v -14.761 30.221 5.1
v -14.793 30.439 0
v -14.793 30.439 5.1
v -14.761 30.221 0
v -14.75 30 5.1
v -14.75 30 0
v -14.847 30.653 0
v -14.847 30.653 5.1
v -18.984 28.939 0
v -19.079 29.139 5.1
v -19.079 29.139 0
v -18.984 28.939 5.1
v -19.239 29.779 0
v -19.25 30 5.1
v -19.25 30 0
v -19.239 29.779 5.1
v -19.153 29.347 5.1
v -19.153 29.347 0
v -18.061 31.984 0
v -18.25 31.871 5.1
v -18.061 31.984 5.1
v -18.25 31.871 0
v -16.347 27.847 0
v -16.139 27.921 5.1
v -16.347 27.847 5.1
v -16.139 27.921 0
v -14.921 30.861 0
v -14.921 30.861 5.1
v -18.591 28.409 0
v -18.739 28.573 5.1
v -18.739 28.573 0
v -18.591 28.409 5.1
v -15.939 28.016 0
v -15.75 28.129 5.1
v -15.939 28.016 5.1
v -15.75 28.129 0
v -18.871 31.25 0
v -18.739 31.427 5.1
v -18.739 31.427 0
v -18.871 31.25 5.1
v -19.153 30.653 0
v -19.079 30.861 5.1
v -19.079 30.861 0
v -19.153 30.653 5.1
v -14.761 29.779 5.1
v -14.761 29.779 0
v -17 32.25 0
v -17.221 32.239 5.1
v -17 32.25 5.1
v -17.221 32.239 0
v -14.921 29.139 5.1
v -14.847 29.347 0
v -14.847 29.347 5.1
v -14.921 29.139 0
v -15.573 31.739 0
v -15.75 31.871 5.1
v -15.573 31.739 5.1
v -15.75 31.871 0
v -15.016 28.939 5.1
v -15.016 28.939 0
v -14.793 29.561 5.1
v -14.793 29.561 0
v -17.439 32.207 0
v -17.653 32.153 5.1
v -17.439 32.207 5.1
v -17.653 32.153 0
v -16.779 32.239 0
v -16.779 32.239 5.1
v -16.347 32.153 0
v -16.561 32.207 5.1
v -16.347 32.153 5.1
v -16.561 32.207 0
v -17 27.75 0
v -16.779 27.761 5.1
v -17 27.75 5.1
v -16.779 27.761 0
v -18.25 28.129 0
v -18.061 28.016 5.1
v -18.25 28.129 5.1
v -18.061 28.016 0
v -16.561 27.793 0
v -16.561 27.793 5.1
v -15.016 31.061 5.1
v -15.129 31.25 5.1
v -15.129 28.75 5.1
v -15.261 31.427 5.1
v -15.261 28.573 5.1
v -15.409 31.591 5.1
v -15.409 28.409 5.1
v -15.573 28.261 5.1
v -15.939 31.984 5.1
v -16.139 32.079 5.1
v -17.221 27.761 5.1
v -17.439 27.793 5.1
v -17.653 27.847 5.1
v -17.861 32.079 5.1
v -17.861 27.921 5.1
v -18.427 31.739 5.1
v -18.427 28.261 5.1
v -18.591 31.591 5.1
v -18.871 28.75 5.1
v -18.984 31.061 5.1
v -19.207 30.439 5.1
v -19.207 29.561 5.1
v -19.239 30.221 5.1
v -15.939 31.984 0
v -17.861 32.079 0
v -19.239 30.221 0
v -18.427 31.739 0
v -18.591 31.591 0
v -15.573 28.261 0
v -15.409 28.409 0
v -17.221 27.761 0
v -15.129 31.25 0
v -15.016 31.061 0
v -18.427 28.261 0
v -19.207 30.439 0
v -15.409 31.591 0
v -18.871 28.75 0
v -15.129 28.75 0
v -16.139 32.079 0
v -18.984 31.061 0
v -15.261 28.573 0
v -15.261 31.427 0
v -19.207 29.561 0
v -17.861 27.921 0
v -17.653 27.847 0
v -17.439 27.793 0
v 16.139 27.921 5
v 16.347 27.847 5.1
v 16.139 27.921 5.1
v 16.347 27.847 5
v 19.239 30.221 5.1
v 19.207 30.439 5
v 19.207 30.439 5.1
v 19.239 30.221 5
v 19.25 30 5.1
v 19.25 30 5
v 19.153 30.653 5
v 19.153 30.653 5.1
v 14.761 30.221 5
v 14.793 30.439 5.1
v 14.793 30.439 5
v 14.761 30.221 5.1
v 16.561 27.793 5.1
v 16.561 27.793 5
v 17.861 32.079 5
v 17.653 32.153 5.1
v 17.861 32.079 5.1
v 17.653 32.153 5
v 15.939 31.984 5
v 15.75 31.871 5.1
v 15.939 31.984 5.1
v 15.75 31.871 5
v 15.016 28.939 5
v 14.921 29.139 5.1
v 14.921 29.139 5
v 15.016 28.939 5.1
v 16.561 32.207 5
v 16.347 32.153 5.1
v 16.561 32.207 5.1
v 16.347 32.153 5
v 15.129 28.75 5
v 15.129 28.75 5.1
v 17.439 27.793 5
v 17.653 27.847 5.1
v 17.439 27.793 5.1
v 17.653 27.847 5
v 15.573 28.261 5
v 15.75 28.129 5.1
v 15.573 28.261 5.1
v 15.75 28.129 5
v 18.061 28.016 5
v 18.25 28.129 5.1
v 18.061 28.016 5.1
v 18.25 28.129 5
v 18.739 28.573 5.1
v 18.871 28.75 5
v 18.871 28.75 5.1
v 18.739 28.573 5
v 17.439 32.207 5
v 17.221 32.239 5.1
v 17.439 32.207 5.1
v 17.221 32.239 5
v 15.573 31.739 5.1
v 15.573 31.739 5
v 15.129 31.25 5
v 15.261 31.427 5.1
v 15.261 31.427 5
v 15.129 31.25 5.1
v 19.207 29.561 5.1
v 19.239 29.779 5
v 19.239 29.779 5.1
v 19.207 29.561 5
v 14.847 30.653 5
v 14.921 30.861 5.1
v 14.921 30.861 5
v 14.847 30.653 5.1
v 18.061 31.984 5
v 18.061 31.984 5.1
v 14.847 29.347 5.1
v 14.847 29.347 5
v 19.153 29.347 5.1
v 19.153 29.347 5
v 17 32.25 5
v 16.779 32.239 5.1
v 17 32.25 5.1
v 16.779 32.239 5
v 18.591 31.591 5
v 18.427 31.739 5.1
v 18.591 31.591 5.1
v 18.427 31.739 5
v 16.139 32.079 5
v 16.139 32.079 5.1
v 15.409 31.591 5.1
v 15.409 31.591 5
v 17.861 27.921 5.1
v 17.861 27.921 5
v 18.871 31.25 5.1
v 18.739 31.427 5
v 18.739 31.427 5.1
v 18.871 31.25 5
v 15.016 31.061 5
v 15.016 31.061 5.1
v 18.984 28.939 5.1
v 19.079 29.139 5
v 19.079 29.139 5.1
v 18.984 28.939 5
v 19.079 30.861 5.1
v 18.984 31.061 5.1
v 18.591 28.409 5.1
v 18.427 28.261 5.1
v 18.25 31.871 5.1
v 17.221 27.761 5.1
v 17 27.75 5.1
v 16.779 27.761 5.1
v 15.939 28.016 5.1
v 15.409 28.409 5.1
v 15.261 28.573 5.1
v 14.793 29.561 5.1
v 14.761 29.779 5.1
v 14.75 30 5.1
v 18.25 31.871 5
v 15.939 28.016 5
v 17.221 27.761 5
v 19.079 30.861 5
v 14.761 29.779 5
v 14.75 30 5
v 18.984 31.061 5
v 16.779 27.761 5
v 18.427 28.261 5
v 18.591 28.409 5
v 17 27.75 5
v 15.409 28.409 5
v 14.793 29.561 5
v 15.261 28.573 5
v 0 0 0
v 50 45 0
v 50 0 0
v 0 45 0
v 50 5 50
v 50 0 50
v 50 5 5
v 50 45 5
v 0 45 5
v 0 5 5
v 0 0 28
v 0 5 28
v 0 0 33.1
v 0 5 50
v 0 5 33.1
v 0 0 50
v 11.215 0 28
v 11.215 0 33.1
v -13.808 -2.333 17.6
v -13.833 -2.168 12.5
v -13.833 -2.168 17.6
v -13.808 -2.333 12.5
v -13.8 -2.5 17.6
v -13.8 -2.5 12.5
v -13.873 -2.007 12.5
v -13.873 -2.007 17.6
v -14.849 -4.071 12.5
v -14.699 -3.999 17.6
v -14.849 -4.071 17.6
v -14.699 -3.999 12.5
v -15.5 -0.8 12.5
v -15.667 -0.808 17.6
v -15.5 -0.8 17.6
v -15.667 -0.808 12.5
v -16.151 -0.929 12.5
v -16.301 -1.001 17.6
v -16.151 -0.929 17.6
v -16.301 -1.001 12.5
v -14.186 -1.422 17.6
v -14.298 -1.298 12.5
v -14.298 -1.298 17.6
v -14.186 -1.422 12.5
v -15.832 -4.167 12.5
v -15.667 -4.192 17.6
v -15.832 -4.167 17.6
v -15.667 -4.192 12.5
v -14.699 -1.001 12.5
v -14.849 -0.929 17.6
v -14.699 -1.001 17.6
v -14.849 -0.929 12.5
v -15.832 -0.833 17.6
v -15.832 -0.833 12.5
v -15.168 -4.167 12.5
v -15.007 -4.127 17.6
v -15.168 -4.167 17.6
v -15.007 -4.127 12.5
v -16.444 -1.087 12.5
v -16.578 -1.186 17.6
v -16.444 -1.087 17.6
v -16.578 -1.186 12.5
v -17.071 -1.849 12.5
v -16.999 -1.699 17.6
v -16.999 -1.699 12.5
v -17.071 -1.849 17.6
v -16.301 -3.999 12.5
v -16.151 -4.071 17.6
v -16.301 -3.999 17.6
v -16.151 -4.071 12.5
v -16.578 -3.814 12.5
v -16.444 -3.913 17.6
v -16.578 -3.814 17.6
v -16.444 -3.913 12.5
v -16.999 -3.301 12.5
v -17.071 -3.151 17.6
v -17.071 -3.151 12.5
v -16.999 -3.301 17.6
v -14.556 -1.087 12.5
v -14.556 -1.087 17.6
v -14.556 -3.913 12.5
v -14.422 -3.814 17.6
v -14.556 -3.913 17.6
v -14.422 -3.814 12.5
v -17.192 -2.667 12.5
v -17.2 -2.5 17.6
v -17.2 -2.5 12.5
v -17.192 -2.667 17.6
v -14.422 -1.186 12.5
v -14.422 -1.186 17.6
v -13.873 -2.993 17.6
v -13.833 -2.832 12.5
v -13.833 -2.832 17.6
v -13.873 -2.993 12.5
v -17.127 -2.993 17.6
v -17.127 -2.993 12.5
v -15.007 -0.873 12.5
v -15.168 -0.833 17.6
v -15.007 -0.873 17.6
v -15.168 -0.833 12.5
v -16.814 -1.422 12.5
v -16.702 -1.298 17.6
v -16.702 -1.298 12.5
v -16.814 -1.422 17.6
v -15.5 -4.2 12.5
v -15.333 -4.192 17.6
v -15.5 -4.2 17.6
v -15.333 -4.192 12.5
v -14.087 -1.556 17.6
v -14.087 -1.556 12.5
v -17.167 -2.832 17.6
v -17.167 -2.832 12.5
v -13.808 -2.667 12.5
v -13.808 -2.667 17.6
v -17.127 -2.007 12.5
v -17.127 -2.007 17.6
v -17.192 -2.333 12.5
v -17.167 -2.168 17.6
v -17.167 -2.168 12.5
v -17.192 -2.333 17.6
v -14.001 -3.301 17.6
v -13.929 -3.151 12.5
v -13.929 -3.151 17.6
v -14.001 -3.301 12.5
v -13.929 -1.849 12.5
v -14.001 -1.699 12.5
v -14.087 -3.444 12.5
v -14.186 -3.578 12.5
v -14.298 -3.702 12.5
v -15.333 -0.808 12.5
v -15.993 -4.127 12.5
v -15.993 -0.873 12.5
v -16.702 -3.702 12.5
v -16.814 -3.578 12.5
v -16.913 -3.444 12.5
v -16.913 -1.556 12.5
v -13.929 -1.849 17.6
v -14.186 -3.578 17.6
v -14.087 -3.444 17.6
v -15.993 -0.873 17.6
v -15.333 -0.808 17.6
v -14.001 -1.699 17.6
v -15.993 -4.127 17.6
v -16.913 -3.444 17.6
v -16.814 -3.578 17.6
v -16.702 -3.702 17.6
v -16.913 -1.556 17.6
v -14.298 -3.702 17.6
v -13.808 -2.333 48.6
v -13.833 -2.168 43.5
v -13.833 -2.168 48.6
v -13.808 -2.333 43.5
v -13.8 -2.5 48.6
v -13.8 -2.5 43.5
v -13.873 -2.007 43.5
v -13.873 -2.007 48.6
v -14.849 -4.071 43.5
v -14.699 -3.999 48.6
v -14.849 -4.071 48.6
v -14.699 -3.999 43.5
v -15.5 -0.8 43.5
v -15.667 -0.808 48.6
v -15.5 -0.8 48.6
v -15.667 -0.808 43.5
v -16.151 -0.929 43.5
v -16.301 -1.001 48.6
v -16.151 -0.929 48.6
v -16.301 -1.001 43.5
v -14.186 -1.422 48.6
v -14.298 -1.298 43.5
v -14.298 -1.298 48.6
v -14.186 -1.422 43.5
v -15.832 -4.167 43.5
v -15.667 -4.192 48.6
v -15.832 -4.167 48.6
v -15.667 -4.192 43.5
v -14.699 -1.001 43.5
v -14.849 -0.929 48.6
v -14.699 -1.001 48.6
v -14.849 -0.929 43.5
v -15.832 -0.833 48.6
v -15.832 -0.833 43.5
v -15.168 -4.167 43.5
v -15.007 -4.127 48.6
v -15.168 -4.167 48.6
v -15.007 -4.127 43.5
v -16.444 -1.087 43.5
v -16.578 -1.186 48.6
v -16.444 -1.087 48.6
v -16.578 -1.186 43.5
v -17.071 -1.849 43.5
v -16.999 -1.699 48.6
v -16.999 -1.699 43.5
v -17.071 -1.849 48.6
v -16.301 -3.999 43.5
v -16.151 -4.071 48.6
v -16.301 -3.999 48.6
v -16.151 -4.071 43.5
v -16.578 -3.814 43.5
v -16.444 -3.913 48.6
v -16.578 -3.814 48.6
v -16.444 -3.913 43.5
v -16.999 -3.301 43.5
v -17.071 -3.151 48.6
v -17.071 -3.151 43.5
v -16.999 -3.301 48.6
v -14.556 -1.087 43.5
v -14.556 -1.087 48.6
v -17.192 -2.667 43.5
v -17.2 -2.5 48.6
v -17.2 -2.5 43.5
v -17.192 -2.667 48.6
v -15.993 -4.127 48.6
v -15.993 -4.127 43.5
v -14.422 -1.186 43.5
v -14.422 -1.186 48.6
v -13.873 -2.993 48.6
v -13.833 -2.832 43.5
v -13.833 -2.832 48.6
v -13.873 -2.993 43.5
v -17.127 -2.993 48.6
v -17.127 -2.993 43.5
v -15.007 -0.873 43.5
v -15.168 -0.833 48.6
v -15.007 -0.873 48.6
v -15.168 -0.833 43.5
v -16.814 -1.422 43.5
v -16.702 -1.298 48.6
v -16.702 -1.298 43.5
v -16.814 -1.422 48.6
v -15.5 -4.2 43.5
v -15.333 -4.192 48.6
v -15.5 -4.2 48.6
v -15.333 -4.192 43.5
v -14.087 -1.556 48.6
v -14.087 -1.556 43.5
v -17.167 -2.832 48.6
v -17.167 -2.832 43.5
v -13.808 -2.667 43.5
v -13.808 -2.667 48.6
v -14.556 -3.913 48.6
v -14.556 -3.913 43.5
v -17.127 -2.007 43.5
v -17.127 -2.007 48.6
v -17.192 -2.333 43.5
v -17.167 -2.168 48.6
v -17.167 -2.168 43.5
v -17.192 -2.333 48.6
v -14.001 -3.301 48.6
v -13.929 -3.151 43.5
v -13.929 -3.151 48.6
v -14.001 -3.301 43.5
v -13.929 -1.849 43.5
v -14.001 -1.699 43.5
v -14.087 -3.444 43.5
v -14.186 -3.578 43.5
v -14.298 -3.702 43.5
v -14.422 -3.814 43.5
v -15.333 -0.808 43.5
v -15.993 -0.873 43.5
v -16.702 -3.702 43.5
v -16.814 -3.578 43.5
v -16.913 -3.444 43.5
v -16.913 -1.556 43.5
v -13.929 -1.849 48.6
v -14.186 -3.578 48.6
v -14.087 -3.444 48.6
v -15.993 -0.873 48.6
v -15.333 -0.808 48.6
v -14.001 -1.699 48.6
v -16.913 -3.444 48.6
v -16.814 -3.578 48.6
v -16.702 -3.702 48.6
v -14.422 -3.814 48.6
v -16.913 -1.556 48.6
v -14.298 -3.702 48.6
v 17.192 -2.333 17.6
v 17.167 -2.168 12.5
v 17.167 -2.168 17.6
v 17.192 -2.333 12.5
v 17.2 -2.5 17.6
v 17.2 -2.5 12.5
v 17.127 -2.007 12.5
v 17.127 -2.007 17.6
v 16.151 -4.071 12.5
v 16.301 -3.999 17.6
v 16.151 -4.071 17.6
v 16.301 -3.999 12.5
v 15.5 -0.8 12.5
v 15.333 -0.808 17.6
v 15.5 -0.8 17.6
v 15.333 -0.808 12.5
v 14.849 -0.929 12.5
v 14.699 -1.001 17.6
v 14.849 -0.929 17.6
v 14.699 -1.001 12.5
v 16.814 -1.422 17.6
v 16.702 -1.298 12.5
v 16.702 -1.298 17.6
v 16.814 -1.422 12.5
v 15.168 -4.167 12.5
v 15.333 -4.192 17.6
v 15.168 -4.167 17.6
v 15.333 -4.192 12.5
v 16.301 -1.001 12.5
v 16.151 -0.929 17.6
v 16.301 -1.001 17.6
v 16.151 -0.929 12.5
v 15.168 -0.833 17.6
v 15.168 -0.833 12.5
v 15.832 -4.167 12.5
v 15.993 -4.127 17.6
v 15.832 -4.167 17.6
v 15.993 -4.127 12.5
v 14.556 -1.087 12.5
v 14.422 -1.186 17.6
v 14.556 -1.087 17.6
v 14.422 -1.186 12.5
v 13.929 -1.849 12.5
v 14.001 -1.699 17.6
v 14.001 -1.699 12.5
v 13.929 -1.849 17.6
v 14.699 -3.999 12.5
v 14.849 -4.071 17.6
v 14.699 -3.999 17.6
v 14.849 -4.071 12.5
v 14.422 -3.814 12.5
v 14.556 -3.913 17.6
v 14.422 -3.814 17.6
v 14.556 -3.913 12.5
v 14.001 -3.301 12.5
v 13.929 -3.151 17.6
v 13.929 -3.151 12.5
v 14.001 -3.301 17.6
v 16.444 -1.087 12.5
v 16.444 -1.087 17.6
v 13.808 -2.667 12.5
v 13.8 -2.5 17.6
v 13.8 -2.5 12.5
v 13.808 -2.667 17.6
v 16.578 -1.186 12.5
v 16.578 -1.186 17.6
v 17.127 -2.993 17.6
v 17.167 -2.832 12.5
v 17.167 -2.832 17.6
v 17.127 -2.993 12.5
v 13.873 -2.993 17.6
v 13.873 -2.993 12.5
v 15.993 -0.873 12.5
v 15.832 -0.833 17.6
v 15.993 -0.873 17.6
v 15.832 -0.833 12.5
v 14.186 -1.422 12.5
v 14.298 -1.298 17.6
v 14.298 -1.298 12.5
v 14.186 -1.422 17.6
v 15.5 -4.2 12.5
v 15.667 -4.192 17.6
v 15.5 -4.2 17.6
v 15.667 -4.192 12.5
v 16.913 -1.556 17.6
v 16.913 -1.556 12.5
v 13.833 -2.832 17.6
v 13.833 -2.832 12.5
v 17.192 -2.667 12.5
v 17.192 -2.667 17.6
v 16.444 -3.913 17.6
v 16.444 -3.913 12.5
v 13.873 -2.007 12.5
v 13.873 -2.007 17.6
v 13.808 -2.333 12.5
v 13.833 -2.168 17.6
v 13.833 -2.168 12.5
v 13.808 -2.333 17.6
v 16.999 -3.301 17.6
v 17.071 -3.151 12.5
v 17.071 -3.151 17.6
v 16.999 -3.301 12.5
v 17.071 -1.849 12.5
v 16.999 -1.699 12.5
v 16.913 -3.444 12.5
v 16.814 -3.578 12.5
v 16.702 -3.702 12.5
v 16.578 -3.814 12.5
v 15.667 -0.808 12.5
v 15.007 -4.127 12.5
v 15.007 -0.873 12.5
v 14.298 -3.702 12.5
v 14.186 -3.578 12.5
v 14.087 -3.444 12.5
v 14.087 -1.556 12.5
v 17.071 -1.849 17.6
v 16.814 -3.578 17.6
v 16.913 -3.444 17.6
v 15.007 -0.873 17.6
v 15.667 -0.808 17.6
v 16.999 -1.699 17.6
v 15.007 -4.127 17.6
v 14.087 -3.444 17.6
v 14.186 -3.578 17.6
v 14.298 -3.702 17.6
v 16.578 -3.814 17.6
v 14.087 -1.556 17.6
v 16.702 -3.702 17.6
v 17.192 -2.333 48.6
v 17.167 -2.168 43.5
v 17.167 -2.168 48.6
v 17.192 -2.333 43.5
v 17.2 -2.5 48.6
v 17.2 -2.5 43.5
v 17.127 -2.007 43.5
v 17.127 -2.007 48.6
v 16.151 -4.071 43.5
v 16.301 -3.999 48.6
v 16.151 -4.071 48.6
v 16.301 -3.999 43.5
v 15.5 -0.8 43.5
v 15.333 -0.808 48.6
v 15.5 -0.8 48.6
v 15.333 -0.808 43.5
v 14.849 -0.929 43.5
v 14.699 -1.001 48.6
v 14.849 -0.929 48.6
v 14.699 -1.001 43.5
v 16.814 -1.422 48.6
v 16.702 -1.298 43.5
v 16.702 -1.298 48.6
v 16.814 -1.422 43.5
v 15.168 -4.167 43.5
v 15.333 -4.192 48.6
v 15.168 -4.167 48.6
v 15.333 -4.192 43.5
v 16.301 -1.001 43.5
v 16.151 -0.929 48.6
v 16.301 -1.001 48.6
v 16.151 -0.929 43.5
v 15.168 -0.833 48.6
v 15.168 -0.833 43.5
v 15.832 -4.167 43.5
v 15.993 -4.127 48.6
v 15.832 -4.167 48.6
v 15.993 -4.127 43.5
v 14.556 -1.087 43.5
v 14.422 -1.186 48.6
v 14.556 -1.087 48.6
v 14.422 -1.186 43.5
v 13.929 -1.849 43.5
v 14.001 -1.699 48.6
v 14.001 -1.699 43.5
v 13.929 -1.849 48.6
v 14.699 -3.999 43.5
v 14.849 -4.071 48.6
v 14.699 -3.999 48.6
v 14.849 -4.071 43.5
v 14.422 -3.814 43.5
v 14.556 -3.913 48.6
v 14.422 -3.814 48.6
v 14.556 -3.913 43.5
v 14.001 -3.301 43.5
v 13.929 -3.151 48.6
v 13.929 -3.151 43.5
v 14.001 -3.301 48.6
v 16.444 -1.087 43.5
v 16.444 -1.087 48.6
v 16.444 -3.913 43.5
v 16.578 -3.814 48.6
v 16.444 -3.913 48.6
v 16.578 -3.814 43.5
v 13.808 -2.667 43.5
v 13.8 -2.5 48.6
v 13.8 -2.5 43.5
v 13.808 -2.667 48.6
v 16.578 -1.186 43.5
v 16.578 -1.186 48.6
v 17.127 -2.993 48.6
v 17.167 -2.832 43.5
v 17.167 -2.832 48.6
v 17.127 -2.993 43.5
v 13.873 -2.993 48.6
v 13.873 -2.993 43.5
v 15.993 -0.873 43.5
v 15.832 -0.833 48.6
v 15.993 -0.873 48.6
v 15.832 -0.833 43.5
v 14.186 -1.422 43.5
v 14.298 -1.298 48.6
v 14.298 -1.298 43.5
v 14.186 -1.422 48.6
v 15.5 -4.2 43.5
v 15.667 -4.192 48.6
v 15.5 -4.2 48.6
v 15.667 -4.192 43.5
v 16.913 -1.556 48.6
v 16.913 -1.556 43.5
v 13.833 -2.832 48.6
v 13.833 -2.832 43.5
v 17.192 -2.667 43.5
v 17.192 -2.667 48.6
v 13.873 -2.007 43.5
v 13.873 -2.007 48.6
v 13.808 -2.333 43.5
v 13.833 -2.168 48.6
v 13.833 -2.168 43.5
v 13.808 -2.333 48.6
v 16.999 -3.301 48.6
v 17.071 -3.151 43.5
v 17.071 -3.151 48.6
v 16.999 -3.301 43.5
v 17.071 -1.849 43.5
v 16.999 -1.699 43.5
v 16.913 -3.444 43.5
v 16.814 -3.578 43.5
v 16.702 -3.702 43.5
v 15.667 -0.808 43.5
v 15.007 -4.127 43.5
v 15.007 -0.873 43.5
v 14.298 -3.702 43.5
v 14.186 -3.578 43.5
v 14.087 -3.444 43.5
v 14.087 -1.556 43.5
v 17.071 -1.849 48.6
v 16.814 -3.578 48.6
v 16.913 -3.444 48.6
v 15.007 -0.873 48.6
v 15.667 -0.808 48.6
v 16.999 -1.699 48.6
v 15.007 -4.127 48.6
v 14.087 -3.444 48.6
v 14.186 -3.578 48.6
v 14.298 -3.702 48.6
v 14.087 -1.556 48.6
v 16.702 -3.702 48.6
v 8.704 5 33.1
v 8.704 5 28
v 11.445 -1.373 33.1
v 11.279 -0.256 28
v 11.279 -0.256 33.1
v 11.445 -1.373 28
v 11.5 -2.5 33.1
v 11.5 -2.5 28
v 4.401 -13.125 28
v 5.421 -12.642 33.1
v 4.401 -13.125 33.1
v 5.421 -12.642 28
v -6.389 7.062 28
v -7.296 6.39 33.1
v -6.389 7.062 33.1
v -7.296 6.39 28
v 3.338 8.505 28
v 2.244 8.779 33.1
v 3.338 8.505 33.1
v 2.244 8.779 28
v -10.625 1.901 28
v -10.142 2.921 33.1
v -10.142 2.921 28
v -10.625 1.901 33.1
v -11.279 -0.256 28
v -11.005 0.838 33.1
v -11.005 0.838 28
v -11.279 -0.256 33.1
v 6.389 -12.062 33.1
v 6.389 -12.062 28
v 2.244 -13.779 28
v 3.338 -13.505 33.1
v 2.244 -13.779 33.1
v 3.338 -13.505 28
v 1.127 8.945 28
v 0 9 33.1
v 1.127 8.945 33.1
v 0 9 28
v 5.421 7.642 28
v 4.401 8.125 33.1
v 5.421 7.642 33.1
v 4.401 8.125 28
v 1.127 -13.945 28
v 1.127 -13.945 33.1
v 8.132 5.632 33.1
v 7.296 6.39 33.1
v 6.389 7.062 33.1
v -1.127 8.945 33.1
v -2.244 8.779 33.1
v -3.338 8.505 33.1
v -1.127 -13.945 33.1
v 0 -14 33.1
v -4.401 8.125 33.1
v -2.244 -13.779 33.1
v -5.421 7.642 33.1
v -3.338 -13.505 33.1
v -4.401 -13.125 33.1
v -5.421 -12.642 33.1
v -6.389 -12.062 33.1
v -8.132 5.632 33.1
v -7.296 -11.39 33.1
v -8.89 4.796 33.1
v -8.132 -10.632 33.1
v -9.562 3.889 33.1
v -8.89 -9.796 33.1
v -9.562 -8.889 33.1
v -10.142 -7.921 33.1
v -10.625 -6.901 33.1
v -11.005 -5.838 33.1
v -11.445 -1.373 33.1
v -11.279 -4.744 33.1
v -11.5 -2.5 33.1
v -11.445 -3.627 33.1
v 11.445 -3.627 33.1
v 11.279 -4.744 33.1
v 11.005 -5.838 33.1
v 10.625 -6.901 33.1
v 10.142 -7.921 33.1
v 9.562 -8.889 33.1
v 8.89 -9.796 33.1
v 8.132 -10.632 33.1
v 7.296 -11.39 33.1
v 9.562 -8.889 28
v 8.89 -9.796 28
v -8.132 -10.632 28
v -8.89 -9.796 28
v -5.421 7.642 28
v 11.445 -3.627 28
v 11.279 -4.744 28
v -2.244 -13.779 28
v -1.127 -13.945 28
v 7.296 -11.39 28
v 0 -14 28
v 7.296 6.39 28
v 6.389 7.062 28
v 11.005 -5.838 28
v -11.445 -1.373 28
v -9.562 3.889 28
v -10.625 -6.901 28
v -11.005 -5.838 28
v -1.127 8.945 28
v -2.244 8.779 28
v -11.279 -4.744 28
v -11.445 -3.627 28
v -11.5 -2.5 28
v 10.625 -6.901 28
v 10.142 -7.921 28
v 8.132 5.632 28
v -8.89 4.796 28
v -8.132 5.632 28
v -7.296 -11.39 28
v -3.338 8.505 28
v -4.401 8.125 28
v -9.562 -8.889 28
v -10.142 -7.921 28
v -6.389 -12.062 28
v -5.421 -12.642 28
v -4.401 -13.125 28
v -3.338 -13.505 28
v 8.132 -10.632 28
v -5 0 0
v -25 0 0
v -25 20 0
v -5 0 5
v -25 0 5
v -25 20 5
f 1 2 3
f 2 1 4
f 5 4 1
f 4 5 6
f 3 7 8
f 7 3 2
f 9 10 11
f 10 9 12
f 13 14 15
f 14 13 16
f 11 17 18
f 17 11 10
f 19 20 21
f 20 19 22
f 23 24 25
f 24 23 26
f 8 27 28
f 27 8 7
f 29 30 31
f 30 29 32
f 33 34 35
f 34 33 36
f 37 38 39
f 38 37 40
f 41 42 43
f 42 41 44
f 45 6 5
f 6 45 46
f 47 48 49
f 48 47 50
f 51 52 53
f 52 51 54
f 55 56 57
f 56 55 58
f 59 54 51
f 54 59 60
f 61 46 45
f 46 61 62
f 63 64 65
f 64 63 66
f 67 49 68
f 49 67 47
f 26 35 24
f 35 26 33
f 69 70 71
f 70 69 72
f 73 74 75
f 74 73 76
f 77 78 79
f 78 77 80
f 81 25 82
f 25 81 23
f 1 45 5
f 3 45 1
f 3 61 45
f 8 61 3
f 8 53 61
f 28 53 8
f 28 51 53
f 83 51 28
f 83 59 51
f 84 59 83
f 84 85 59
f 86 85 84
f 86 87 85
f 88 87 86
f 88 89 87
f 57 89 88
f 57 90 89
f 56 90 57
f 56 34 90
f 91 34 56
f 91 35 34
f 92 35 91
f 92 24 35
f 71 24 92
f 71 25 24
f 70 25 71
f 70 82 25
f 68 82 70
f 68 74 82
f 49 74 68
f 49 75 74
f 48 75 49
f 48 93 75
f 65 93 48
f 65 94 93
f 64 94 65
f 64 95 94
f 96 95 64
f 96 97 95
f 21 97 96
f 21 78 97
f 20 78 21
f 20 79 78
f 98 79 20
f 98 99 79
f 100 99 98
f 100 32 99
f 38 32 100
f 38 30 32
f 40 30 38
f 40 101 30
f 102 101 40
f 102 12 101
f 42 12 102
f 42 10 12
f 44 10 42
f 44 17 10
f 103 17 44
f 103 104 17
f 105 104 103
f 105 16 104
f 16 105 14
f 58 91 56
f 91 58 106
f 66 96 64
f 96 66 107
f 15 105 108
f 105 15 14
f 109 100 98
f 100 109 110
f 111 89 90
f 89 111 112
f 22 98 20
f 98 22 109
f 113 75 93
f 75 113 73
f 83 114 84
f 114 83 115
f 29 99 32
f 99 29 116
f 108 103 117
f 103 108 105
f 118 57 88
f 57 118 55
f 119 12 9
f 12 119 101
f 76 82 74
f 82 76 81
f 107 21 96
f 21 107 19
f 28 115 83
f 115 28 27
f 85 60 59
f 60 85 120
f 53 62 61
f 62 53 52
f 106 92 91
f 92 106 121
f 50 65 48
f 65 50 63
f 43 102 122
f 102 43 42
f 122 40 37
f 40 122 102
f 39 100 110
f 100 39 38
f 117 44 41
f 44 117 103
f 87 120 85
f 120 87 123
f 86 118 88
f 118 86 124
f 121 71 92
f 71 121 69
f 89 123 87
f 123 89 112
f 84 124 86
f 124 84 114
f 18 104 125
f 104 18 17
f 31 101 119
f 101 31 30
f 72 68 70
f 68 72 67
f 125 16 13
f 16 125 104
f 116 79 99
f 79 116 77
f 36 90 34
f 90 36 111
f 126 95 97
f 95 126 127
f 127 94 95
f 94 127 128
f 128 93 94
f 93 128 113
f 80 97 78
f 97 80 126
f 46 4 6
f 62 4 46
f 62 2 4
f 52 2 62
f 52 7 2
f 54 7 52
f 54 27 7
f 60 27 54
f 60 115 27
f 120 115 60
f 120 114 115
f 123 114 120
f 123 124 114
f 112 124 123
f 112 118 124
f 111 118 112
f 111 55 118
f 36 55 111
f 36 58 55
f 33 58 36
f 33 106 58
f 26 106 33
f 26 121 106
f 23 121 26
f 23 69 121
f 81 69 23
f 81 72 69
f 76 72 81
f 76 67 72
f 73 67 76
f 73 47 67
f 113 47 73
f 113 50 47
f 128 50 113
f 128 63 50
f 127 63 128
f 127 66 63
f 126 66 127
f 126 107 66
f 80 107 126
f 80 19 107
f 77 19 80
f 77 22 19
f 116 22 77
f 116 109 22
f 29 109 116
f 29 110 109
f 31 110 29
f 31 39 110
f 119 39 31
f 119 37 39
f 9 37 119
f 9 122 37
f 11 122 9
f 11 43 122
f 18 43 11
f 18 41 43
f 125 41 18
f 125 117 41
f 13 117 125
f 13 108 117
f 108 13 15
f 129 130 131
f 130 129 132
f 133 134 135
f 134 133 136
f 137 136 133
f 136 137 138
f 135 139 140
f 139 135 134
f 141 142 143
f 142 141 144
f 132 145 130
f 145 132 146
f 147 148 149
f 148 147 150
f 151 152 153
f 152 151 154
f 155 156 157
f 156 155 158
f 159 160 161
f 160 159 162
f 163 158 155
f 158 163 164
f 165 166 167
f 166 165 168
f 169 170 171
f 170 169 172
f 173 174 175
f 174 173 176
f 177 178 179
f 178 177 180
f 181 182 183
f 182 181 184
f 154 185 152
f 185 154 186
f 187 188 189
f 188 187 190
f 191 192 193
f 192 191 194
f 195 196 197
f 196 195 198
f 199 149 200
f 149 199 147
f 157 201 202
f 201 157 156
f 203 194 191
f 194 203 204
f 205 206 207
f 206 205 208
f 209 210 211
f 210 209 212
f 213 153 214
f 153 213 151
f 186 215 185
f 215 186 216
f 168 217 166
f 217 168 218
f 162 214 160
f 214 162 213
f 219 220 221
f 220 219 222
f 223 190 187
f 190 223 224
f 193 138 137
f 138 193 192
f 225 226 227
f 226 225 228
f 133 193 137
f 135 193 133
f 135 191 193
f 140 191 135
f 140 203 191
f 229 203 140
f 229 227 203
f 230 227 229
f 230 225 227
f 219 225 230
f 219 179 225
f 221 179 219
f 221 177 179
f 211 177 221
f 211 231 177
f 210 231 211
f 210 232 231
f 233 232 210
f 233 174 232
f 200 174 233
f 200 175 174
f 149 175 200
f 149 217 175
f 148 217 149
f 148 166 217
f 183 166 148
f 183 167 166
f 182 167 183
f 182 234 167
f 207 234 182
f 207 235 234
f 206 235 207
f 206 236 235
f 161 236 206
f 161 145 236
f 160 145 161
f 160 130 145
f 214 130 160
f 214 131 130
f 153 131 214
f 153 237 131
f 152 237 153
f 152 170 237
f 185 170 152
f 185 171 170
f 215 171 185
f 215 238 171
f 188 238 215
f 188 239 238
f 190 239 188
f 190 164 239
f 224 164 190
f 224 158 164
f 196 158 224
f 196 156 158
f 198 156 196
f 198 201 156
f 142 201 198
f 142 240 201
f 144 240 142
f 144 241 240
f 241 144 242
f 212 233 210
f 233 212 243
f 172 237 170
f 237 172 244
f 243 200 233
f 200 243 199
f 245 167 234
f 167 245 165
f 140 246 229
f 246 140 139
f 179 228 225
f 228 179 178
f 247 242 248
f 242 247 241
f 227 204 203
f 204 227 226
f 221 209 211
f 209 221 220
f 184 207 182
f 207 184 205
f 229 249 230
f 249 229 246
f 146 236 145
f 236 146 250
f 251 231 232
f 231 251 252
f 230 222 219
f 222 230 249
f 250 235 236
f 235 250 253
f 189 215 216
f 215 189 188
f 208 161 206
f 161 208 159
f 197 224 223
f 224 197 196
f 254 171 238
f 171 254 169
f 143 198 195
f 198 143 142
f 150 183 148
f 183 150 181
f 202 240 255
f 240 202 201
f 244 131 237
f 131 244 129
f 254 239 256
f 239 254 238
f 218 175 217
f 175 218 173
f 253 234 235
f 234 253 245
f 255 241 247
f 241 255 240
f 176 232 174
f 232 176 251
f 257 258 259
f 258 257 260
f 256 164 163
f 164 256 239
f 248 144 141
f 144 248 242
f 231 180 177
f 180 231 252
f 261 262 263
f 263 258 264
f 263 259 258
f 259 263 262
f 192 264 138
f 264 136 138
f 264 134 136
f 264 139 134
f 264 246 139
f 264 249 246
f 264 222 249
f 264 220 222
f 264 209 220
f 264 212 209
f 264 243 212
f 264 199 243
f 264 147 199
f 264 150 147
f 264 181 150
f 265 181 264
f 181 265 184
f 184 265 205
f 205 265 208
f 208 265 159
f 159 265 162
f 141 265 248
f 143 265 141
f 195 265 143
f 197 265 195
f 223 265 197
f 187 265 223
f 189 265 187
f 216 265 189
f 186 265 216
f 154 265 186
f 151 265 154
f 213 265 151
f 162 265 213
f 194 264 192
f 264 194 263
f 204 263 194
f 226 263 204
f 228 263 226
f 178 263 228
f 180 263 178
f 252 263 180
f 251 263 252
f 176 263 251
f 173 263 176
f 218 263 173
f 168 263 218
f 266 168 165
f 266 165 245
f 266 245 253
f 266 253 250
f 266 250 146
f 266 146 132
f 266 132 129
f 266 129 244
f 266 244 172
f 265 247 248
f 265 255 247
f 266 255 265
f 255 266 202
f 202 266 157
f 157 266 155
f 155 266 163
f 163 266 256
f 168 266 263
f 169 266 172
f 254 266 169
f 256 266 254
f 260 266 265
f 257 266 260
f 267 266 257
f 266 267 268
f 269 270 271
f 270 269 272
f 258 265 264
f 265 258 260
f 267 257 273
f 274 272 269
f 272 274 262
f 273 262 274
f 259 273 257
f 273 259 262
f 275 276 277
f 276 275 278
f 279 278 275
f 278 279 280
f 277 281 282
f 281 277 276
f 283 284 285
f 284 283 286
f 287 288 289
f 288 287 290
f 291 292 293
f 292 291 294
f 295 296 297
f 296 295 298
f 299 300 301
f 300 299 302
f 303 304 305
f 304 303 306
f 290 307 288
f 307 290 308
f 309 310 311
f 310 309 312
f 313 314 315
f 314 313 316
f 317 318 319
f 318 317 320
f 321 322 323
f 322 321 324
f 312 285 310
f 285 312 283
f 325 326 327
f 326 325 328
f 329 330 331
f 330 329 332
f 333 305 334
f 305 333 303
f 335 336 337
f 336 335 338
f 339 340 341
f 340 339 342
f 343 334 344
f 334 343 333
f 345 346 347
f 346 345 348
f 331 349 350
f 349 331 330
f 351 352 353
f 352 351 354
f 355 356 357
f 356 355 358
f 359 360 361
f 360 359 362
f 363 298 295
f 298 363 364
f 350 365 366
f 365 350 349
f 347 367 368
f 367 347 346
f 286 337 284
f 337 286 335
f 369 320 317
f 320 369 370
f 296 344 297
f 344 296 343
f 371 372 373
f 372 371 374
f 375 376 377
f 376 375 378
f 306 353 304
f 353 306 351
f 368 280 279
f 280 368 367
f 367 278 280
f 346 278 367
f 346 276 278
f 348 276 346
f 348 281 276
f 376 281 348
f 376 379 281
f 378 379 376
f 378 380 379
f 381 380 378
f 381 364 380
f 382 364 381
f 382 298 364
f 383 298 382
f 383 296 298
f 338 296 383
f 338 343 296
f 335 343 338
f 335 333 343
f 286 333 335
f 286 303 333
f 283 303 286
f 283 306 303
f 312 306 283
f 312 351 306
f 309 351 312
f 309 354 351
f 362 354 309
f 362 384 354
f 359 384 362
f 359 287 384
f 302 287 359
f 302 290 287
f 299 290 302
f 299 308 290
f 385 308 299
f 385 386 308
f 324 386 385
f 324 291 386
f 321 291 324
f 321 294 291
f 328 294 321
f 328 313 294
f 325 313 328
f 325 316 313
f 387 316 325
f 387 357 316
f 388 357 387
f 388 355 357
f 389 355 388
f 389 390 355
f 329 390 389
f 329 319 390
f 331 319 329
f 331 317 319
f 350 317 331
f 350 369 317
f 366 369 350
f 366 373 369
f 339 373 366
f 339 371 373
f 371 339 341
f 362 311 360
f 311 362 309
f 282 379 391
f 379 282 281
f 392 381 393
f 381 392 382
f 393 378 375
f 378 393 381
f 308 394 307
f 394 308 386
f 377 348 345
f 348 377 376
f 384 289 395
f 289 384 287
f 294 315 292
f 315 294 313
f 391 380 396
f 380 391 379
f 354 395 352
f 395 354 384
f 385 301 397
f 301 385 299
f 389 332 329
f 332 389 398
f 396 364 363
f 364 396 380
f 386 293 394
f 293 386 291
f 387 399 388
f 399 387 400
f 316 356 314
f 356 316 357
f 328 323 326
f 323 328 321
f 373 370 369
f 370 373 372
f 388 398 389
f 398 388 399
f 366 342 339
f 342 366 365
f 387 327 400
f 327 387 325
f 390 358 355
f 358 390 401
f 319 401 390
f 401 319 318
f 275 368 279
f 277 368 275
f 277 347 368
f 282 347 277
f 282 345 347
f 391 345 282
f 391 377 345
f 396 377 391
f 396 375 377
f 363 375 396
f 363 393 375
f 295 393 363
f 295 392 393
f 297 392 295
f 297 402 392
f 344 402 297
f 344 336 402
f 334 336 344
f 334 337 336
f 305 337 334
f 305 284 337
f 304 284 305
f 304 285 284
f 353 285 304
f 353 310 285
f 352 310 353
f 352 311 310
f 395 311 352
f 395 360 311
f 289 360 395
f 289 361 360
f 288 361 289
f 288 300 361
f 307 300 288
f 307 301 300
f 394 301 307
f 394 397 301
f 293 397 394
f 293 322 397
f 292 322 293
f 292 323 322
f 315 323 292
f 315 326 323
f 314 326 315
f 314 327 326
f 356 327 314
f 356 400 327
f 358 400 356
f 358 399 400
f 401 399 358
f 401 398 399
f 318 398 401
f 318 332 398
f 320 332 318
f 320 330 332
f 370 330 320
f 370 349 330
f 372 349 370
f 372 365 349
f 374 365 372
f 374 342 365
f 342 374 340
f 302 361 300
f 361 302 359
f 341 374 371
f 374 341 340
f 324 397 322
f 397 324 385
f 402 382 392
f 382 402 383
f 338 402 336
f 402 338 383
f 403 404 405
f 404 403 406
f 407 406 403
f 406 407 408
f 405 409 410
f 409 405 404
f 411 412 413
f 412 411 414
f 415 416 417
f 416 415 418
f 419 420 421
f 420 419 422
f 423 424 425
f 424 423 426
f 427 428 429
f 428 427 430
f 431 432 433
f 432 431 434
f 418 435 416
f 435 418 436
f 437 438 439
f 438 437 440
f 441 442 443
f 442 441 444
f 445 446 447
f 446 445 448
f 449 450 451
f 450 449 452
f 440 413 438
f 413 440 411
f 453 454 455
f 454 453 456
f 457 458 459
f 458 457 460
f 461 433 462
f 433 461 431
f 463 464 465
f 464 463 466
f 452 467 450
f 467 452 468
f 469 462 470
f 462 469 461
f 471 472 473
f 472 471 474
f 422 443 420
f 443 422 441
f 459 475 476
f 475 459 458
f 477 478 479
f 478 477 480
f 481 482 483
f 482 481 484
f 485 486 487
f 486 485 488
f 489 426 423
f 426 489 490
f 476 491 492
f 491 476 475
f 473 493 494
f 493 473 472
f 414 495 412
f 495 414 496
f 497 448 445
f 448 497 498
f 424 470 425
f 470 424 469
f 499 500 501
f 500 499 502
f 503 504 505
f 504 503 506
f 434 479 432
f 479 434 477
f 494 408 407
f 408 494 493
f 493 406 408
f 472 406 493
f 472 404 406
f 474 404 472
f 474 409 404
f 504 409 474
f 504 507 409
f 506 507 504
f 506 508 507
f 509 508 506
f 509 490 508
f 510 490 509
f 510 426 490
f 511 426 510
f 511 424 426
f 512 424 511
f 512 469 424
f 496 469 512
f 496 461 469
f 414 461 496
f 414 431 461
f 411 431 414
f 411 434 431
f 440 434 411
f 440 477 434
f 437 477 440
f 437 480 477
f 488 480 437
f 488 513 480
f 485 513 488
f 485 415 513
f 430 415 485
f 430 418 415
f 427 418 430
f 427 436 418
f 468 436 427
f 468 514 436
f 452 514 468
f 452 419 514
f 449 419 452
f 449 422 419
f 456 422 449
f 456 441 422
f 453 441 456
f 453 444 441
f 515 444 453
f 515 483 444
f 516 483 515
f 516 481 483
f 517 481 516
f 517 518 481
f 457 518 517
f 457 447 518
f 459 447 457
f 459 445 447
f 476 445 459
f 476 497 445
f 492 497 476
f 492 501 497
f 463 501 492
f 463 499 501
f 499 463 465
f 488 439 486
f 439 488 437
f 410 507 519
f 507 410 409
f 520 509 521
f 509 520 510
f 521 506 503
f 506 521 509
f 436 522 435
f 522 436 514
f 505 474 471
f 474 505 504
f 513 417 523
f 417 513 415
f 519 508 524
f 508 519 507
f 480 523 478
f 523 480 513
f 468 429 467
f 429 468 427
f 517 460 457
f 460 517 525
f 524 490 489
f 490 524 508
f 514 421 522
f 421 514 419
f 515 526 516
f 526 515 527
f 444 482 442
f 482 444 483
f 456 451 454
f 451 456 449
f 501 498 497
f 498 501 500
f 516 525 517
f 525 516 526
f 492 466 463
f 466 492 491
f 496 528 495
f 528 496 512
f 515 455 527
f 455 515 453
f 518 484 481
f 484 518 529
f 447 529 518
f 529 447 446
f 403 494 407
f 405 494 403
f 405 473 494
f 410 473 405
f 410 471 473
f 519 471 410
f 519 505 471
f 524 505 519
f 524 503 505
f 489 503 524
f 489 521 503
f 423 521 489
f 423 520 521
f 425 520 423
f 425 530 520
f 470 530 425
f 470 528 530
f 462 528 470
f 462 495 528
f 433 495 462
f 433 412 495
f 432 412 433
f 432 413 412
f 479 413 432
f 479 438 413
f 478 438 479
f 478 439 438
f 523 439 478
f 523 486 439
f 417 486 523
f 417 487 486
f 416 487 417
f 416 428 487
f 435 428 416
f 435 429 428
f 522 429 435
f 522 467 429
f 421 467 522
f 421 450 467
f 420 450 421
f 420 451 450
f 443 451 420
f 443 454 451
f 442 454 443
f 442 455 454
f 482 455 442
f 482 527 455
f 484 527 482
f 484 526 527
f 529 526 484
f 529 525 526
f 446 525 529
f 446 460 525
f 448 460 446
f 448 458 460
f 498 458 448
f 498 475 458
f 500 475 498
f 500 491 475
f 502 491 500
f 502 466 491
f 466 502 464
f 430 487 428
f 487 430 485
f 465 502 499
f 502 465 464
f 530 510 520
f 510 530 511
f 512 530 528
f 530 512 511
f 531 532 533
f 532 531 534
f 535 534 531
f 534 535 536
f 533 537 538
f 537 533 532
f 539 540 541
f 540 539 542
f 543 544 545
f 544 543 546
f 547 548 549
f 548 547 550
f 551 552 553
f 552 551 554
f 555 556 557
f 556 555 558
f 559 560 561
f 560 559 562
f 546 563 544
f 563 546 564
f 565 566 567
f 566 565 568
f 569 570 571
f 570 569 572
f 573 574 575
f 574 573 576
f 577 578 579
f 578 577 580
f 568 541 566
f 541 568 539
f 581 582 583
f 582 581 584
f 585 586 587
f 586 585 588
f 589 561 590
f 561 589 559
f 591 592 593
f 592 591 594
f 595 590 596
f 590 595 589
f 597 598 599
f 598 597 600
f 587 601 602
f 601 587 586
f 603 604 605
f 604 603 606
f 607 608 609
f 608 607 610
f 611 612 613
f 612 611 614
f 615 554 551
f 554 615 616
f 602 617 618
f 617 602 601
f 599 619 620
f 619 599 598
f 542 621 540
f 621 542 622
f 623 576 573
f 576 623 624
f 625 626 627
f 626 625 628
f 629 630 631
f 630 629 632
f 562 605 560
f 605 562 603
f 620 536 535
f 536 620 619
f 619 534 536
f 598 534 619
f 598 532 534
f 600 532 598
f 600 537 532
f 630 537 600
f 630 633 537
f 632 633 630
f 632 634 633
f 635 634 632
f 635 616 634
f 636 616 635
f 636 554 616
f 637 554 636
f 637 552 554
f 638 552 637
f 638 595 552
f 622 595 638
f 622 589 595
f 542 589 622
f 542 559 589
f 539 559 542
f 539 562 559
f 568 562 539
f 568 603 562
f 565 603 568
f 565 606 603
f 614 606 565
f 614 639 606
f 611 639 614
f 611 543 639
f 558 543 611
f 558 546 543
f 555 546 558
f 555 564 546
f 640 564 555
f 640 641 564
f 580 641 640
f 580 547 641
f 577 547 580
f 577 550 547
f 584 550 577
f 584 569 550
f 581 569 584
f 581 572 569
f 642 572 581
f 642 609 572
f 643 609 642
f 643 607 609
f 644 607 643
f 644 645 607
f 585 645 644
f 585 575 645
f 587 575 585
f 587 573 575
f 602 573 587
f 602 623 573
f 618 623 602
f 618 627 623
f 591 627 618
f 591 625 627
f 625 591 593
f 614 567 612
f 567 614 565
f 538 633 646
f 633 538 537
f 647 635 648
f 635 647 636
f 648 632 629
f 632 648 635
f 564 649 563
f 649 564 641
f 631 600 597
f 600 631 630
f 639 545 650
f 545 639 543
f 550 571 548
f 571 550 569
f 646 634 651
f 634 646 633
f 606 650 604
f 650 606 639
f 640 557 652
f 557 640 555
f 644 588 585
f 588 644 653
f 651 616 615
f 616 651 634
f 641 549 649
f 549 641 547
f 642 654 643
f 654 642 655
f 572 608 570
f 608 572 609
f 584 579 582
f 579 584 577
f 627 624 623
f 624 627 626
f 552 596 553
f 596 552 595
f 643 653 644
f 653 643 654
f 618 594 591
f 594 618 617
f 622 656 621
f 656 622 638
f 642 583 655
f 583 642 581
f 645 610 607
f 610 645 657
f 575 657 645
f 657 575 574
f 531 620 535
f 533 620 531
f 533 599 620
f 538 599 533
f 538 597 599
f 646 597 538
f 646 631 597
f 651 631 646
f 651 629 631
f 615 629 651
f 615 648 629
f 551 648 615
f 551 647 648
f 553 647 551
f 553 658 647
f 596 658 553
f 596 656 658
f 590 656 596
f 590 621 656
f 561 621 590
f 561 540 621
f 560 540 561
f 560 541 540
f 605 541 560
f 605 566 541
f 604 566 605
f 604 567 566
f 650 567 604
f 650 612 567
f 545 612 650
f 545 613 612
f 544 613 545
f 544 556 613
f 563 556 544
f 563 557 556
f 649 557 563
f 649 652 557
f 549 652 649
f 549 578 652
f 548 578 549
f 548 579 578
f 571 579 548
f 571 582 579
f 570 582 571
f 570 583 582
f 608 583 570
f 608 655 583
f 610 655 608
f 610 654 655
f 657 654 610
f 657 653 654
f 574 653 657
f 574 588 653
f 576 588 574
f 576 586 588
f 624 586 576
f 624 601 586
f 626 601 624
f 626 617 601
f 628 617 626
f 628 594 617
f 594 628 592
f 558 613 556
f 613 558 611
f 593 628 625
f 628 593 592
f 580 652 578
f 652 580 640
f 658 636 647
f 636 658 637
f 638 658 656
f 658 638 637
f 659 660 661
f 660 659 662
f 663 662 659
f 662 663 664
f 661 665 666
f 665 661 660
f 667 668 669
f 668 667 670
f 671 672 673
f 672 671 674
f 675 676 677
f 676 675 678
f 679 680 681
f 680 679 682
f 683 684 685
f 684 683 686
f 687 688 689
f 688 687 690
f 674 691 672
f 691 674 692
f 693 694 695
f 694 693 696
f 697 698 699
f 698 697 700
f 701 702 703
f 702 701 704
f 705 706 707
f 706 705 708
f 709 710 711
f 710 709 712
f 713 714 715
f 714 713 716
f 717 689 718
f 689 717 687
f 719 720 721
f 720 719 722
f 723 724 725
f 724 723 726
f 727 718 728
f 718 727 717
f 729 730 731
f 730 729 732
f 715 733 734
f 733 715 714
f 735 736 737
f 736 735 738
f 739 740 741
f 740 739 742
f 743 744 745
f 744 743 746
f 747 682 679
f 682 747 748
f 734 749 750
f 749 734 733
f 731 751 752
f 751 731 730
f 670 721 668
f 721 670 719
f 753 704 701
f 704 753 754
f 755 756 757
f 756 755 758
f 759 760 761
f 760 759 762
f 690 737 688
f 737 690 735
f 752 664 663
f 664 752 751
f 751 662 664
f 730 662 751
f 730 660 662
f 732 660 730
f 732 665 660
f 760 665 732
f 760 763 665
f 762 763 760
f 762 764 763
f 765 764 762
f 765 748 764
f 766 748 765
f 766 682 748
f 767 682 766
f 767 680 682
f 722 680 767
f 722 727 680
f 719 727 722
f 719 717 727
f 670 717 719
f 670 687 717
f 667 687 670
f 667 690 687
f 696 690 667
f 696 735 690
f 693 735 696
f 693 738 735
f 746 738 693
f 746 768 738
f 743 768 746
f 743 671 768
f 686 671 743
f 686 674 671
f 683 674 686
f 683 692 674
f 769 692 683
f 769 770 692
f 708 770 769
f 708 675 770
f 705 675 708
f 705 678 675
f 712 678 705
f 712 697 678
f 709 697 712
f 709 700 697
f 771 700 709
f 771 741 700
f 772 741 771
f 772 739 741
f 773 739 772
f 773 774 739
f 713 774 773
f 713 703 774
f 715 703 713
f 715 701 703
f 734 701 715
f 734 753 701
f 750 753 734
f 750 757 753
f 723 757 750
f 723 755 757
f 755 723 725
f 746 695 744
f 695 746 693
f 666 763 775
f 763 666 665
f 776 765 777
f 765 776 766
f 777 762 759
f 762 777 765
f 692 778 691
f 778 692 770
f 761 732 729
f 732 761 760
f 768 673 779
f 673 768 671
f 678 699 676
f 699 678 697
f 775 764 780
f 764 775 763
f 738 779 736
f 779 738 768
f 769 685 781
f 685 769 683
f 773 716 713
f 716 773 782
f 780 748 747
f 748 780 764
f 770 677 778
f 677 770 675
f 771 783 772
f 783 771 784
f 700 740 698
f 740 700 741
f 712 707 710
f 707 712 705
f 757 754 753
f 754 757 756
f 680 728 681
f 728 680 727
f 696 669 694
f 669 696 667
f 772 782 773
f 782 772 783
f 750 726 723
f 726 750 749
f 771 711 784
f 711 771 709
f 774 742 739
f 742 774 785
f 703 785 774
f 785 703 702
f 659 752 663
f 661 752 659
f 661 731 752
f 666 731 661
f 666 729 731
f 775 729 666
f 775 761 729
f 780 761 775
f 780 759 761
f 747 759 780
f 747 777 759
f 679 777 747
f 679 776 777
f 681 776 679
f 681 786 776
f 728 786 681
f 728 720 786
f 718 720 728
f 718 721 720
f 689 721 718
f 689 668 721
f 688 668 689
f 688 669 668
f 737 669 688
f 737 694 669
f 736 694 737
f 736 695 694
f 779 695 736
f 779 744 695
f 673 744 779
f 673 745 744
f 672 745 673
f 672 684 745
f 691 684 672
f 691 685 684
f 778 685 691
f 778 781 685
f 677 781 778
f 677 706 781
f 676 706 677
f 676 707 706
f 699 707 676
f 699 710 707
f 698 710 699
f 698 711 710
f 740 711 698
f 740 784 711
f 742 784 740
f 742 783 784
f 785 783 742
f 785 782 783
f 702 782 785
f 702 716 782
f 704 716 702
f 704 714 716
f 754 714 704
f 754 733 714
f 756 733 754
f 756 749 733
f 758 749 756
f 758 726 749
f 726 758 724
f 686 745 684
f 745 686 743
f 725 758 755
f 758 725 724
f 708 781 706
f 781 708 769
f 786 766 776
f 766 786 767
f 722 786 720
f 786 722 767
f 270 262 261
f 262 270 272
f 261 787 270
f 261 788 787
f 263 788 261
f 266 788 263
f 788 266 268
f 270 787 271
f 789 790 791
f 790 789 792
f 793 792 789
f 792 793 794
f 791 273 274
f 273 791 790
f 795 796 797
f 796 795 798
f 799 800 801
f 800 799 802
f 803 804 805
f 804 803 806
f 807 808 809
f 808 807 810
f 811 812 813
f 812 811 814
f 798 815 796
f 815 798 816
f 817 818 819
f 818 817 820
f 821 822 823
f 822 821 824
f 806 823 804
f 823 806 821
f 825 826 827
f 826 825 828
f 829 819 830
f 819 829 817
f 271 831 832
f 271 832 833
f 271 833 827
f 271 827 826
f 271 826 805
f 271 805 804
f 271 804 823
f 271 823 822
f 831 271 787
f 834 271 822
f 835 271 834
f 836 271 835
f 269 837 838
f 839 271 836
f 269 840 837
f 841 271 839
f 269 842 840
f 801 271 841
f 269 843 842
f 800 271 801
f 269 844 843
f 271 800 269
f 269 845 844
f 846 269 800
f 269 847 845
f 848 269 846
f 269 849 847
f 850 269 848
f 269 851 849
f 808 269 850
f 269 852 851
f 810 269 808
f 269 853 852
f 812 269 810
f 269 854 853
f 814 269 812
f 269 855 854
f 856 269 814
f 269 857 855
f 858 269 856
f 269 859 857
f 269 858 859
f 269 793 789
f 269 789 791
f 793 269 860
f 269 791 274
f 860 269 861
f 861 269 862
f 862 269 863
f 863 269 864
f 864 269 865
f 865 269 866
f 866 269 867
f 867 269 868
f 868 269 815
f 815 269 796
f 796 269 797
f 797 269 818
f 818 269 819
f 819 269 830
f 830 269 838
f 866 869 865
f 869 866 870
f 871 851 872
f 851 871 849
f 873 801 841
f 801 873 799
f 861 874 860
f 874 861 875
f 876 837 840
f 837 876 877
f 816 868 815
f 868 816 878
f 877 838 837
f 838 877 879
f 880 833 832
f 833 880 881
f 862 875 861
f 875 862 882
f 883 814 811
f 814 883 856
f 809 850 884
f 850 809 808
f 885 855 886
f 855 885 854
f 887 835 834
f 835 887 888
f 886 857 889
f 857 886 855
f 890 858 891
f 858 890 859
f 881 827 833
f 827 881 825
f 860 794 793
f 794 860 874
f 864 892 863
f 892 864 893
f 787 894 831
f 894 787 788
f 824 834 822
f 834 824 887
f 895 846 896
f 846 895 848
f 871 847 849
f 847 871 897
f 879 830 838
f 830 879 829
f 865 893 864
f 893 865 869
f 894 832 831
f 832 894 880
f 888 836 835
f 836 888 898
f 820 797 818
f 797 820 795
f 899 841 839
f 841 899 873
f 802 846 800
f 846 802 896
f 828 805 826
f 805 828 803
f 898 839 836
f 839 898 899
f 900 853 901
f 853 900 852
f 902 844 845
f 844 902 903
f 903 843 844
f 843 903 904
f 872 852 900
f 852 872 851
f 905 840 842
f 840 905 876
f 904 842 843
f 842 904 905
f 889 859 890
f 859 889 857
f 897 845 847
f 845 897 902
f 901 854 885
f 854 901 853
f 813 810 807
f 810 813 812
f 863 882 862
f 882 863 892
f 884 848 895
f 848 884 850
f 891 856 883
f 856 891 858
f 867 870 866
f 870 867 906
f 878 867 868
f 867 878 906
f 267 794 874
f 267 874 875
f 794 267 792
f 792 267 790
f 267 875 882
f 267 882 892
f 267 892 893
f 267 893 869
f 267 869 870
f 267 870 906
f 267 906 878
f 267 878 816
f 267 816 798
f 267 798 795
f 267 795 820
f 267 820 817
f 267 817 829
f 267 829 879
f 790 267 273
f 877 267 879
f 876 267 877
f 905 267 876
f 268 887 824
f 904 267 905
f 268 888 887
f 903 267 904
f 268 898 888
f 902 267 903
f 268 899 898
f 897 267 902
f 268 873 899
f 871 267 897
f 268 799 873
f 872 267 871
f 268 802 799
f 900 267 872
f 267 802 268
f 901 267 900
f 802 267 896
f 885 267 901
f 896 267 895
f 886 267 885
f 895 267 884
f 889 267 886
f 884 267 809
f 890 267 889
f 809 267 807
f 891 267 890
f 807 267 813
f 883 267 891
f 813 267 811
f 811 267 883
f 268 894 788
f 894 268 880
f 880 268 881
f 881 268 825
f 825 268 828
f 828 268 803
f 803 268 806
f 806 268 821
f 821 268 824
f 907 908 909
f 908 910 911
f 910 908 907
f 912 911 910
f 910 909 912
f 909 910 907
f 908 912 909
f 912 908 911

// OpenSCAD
$fn = 128;

// --- Base Plate Dimensions ---
// X range: -25 to 25 (Width = 50)
// Y range: 0 to 45 (Length = 45)
// Z range: 0 to 5 (Thickness = 5)
BASE_X_MIN = -25;
BASE_X_MAX = 25;
BASE_Y_MIN = 0;
BASE_Y_MAX = 45;
BASE_Z_MAX = 5;

// --- Base Plate Holes (M4) ---
// Position: x = -17, y = 30 and x = 17, y = 30
// Diameter: 4.5 mm
BASE_HOLE_X_1 = -17;
BASE_HOLE_X_2 = 17;
BASE_HOLE_Y = 30;
BASE_HOLE_DIAMETER = 4.5;

// --- Vertical Motor Plate Dimensions ---
// X range: -25 to 25 (Width = 50)
// Y range: 0 to 5 (Thickness = 5)
// Z range: 0 to 50 (Height = 50)
// Stands on the back edge of the base (y=0)
MOTOR_X_MIN = -25;
MOTOR_X_MAX = 25;
MOTOR_Y_MAX = 5;
MOTOR_Z_MAX = 50;

// --- Motor Plate Boss Hole ---
// Diameter: 23 mm
// Centre: x = 0, z = 28
// Cut along Y axis (through the motor plate thickness)
BOSS_DIAMETER = 23;
BOSS_X = 0;
BOSS_Z = 28;

// --- Motor Plate Screw Holes (M3) ---
// Diameter: 3.4 mm
// Pattern: 31 mm square, centred on boss hole
// 4 holes total
SCREW_DIAMETER = 3.4;
SCREW_PATTERN_SIZE = 31;

// --- Gusset Dimensions ---
// Thickness: 5 mm (matches base and motor plate)
// Location: Left (x=-25 to -20) and Right (x=20 to 25)
// Shape: Right triangle in YZ plane
// Legs: 20 mm along +Y and 20 mm along +Z
// Right-angle corner at y=5, z=5
GUSSET_THICKNESS = 5;
GUSSET_Y_LEG = 20;
GUSSET_Z_LEG = 20;
GUSSET_CORNER_Y = 5;
GUSSET_CORNER_Z = 5;

// --- Build ---

module base_plate() {
    // Main block
    cube([
        BASE_X_MAX - BASE_X_MIN,
        BASE_Y_MAX - BASE_Y_MIN,
        BASE_Z_MAX
    ], center = false);

    // Cut M4 holes
    // Extend slightly past the top face (z=5) to ensure clean cut
    for (i = [0, 1]) {
        translate([
            i == 0 ? BASE_HOLE_X_1 : BASE_HOLE_X_2,
            BASE_HOLE_Y,
            0 // Start at z=0
        ]) {
            cylinder(
                h = BASE_Z_MAX + 0.1,
                d = BASE_HOLE_DIAMETER,
                $fn = 64
            );
        }
    }
}

module motor_plate() {
    // Main block
    cube([
        MOTOR_X_MAX - MOTOR_X_MIN,
        MOTOR_Y_MAX,
        MOTOR_Z_MAX
    ], center = false);

    // Cut Boss Hole (along Y)
    // Center at x=0, z=28. Cut through the entire Y thickness (0 to 5).
    translate([BOSS_X, -MOTOR_Y_MAX/2, BOSS_Z]) {
        cylinder(
            h = MOTOR_Y_MAX + 0.1,
            d = BOSS_DIAMETER,
            $fn = 64
        );
    }

    // Cut Screw Holes (4 holes on 31mm square)
    // Pattern centered at (0, 2.5, BOSS_Z)
    // Square size 31mm -> offset from center is 15.5mm
    // Holes at: x = +/- 15.5, z = BOSS_Z +/- 15.5
    for (x_offset = [-1, 1]) {
        for (z_offset = [-1, 1]) {
            translate([
                x_offset * (SCREW_PATTERN_SIZE / 2),
                -MOTOR_Y_MAX/2, // Start at y=0
                BOSS_Z + z_offset * (SCREW_PATTERN_SIZE / 2)
            ]) {
                cylinder(
                    h = MOTOR_Y_MAX + 0.1,
                    d = SCREW_DIAMETER,
                    $fn = 64
                );
            }
        }
    }
}

module gusset() {
    // Right triangle in YZ plane
    // Right angle at (y=5, z=5)
    // Extends +Y by 20, +Z by 20
    // Thickness in X is 5
    
    // Define vertices for the triangle in YZ plane relative to the corner (5,5)
    // Point 1: Corner (0, 0) relative to corner
    // Point 2: Along Y (20, 0) relative to corner
    // Point 3: Along Z (0, 20) relative to corner
    // This forms a right triangle with legs 20 and 20.
    
    // We will translate this profile to the absolute position (y=5, z=5) later.
    
    // Define the polygon points (2D coordinates for linear_extrude)
    // Order: Corner -> Along Y -> Along Z -> Corner
    points = [
        [0, 0],
        [GUSSET_Y_LEG, 0],
        [0, GUSSET_Z_LEG]
    ];
    
    // Extrude along X axis
    linear_extrude(height = GUSSET_THICKNESS, center = false) {
        polygon(points = points);
    }
}

// --- Assembly ---
union() {
    base_plate();
    motor_plate();
    
    // Left Gusset (x = -25 to -20)
    // The gusset module creates a 5mm thick block.
    // We place the center of this block at x = -25 + 2.5 = -22.5? 
    // No, the user wants it flush with the edge x=-25 to -20.
    // So the block should span x=-25 to x=-20.
    // If we use linear_extrude with center=false, the extrusion starts at x=0 and goes to x=5.
    // We need to translate it so it sits at x=-25.
    // translate([-25, 0, 0]) puts the start of the extrusion at -25.
    // This results in x range [-25, -20]. Correct.
    translate([-25, 0, 0]) {
        gusset();
    }
    
    // Right Gusset (x = 20 to 25)
    // We need the block to span x=20 to x=25.
    // translate([20, 0, 0]) puts the start of the extrusion at 20.
    // This results in x range [20, 25]. Correct.
    translate([20, 0, 0]) {
        gusset();
    }
}
